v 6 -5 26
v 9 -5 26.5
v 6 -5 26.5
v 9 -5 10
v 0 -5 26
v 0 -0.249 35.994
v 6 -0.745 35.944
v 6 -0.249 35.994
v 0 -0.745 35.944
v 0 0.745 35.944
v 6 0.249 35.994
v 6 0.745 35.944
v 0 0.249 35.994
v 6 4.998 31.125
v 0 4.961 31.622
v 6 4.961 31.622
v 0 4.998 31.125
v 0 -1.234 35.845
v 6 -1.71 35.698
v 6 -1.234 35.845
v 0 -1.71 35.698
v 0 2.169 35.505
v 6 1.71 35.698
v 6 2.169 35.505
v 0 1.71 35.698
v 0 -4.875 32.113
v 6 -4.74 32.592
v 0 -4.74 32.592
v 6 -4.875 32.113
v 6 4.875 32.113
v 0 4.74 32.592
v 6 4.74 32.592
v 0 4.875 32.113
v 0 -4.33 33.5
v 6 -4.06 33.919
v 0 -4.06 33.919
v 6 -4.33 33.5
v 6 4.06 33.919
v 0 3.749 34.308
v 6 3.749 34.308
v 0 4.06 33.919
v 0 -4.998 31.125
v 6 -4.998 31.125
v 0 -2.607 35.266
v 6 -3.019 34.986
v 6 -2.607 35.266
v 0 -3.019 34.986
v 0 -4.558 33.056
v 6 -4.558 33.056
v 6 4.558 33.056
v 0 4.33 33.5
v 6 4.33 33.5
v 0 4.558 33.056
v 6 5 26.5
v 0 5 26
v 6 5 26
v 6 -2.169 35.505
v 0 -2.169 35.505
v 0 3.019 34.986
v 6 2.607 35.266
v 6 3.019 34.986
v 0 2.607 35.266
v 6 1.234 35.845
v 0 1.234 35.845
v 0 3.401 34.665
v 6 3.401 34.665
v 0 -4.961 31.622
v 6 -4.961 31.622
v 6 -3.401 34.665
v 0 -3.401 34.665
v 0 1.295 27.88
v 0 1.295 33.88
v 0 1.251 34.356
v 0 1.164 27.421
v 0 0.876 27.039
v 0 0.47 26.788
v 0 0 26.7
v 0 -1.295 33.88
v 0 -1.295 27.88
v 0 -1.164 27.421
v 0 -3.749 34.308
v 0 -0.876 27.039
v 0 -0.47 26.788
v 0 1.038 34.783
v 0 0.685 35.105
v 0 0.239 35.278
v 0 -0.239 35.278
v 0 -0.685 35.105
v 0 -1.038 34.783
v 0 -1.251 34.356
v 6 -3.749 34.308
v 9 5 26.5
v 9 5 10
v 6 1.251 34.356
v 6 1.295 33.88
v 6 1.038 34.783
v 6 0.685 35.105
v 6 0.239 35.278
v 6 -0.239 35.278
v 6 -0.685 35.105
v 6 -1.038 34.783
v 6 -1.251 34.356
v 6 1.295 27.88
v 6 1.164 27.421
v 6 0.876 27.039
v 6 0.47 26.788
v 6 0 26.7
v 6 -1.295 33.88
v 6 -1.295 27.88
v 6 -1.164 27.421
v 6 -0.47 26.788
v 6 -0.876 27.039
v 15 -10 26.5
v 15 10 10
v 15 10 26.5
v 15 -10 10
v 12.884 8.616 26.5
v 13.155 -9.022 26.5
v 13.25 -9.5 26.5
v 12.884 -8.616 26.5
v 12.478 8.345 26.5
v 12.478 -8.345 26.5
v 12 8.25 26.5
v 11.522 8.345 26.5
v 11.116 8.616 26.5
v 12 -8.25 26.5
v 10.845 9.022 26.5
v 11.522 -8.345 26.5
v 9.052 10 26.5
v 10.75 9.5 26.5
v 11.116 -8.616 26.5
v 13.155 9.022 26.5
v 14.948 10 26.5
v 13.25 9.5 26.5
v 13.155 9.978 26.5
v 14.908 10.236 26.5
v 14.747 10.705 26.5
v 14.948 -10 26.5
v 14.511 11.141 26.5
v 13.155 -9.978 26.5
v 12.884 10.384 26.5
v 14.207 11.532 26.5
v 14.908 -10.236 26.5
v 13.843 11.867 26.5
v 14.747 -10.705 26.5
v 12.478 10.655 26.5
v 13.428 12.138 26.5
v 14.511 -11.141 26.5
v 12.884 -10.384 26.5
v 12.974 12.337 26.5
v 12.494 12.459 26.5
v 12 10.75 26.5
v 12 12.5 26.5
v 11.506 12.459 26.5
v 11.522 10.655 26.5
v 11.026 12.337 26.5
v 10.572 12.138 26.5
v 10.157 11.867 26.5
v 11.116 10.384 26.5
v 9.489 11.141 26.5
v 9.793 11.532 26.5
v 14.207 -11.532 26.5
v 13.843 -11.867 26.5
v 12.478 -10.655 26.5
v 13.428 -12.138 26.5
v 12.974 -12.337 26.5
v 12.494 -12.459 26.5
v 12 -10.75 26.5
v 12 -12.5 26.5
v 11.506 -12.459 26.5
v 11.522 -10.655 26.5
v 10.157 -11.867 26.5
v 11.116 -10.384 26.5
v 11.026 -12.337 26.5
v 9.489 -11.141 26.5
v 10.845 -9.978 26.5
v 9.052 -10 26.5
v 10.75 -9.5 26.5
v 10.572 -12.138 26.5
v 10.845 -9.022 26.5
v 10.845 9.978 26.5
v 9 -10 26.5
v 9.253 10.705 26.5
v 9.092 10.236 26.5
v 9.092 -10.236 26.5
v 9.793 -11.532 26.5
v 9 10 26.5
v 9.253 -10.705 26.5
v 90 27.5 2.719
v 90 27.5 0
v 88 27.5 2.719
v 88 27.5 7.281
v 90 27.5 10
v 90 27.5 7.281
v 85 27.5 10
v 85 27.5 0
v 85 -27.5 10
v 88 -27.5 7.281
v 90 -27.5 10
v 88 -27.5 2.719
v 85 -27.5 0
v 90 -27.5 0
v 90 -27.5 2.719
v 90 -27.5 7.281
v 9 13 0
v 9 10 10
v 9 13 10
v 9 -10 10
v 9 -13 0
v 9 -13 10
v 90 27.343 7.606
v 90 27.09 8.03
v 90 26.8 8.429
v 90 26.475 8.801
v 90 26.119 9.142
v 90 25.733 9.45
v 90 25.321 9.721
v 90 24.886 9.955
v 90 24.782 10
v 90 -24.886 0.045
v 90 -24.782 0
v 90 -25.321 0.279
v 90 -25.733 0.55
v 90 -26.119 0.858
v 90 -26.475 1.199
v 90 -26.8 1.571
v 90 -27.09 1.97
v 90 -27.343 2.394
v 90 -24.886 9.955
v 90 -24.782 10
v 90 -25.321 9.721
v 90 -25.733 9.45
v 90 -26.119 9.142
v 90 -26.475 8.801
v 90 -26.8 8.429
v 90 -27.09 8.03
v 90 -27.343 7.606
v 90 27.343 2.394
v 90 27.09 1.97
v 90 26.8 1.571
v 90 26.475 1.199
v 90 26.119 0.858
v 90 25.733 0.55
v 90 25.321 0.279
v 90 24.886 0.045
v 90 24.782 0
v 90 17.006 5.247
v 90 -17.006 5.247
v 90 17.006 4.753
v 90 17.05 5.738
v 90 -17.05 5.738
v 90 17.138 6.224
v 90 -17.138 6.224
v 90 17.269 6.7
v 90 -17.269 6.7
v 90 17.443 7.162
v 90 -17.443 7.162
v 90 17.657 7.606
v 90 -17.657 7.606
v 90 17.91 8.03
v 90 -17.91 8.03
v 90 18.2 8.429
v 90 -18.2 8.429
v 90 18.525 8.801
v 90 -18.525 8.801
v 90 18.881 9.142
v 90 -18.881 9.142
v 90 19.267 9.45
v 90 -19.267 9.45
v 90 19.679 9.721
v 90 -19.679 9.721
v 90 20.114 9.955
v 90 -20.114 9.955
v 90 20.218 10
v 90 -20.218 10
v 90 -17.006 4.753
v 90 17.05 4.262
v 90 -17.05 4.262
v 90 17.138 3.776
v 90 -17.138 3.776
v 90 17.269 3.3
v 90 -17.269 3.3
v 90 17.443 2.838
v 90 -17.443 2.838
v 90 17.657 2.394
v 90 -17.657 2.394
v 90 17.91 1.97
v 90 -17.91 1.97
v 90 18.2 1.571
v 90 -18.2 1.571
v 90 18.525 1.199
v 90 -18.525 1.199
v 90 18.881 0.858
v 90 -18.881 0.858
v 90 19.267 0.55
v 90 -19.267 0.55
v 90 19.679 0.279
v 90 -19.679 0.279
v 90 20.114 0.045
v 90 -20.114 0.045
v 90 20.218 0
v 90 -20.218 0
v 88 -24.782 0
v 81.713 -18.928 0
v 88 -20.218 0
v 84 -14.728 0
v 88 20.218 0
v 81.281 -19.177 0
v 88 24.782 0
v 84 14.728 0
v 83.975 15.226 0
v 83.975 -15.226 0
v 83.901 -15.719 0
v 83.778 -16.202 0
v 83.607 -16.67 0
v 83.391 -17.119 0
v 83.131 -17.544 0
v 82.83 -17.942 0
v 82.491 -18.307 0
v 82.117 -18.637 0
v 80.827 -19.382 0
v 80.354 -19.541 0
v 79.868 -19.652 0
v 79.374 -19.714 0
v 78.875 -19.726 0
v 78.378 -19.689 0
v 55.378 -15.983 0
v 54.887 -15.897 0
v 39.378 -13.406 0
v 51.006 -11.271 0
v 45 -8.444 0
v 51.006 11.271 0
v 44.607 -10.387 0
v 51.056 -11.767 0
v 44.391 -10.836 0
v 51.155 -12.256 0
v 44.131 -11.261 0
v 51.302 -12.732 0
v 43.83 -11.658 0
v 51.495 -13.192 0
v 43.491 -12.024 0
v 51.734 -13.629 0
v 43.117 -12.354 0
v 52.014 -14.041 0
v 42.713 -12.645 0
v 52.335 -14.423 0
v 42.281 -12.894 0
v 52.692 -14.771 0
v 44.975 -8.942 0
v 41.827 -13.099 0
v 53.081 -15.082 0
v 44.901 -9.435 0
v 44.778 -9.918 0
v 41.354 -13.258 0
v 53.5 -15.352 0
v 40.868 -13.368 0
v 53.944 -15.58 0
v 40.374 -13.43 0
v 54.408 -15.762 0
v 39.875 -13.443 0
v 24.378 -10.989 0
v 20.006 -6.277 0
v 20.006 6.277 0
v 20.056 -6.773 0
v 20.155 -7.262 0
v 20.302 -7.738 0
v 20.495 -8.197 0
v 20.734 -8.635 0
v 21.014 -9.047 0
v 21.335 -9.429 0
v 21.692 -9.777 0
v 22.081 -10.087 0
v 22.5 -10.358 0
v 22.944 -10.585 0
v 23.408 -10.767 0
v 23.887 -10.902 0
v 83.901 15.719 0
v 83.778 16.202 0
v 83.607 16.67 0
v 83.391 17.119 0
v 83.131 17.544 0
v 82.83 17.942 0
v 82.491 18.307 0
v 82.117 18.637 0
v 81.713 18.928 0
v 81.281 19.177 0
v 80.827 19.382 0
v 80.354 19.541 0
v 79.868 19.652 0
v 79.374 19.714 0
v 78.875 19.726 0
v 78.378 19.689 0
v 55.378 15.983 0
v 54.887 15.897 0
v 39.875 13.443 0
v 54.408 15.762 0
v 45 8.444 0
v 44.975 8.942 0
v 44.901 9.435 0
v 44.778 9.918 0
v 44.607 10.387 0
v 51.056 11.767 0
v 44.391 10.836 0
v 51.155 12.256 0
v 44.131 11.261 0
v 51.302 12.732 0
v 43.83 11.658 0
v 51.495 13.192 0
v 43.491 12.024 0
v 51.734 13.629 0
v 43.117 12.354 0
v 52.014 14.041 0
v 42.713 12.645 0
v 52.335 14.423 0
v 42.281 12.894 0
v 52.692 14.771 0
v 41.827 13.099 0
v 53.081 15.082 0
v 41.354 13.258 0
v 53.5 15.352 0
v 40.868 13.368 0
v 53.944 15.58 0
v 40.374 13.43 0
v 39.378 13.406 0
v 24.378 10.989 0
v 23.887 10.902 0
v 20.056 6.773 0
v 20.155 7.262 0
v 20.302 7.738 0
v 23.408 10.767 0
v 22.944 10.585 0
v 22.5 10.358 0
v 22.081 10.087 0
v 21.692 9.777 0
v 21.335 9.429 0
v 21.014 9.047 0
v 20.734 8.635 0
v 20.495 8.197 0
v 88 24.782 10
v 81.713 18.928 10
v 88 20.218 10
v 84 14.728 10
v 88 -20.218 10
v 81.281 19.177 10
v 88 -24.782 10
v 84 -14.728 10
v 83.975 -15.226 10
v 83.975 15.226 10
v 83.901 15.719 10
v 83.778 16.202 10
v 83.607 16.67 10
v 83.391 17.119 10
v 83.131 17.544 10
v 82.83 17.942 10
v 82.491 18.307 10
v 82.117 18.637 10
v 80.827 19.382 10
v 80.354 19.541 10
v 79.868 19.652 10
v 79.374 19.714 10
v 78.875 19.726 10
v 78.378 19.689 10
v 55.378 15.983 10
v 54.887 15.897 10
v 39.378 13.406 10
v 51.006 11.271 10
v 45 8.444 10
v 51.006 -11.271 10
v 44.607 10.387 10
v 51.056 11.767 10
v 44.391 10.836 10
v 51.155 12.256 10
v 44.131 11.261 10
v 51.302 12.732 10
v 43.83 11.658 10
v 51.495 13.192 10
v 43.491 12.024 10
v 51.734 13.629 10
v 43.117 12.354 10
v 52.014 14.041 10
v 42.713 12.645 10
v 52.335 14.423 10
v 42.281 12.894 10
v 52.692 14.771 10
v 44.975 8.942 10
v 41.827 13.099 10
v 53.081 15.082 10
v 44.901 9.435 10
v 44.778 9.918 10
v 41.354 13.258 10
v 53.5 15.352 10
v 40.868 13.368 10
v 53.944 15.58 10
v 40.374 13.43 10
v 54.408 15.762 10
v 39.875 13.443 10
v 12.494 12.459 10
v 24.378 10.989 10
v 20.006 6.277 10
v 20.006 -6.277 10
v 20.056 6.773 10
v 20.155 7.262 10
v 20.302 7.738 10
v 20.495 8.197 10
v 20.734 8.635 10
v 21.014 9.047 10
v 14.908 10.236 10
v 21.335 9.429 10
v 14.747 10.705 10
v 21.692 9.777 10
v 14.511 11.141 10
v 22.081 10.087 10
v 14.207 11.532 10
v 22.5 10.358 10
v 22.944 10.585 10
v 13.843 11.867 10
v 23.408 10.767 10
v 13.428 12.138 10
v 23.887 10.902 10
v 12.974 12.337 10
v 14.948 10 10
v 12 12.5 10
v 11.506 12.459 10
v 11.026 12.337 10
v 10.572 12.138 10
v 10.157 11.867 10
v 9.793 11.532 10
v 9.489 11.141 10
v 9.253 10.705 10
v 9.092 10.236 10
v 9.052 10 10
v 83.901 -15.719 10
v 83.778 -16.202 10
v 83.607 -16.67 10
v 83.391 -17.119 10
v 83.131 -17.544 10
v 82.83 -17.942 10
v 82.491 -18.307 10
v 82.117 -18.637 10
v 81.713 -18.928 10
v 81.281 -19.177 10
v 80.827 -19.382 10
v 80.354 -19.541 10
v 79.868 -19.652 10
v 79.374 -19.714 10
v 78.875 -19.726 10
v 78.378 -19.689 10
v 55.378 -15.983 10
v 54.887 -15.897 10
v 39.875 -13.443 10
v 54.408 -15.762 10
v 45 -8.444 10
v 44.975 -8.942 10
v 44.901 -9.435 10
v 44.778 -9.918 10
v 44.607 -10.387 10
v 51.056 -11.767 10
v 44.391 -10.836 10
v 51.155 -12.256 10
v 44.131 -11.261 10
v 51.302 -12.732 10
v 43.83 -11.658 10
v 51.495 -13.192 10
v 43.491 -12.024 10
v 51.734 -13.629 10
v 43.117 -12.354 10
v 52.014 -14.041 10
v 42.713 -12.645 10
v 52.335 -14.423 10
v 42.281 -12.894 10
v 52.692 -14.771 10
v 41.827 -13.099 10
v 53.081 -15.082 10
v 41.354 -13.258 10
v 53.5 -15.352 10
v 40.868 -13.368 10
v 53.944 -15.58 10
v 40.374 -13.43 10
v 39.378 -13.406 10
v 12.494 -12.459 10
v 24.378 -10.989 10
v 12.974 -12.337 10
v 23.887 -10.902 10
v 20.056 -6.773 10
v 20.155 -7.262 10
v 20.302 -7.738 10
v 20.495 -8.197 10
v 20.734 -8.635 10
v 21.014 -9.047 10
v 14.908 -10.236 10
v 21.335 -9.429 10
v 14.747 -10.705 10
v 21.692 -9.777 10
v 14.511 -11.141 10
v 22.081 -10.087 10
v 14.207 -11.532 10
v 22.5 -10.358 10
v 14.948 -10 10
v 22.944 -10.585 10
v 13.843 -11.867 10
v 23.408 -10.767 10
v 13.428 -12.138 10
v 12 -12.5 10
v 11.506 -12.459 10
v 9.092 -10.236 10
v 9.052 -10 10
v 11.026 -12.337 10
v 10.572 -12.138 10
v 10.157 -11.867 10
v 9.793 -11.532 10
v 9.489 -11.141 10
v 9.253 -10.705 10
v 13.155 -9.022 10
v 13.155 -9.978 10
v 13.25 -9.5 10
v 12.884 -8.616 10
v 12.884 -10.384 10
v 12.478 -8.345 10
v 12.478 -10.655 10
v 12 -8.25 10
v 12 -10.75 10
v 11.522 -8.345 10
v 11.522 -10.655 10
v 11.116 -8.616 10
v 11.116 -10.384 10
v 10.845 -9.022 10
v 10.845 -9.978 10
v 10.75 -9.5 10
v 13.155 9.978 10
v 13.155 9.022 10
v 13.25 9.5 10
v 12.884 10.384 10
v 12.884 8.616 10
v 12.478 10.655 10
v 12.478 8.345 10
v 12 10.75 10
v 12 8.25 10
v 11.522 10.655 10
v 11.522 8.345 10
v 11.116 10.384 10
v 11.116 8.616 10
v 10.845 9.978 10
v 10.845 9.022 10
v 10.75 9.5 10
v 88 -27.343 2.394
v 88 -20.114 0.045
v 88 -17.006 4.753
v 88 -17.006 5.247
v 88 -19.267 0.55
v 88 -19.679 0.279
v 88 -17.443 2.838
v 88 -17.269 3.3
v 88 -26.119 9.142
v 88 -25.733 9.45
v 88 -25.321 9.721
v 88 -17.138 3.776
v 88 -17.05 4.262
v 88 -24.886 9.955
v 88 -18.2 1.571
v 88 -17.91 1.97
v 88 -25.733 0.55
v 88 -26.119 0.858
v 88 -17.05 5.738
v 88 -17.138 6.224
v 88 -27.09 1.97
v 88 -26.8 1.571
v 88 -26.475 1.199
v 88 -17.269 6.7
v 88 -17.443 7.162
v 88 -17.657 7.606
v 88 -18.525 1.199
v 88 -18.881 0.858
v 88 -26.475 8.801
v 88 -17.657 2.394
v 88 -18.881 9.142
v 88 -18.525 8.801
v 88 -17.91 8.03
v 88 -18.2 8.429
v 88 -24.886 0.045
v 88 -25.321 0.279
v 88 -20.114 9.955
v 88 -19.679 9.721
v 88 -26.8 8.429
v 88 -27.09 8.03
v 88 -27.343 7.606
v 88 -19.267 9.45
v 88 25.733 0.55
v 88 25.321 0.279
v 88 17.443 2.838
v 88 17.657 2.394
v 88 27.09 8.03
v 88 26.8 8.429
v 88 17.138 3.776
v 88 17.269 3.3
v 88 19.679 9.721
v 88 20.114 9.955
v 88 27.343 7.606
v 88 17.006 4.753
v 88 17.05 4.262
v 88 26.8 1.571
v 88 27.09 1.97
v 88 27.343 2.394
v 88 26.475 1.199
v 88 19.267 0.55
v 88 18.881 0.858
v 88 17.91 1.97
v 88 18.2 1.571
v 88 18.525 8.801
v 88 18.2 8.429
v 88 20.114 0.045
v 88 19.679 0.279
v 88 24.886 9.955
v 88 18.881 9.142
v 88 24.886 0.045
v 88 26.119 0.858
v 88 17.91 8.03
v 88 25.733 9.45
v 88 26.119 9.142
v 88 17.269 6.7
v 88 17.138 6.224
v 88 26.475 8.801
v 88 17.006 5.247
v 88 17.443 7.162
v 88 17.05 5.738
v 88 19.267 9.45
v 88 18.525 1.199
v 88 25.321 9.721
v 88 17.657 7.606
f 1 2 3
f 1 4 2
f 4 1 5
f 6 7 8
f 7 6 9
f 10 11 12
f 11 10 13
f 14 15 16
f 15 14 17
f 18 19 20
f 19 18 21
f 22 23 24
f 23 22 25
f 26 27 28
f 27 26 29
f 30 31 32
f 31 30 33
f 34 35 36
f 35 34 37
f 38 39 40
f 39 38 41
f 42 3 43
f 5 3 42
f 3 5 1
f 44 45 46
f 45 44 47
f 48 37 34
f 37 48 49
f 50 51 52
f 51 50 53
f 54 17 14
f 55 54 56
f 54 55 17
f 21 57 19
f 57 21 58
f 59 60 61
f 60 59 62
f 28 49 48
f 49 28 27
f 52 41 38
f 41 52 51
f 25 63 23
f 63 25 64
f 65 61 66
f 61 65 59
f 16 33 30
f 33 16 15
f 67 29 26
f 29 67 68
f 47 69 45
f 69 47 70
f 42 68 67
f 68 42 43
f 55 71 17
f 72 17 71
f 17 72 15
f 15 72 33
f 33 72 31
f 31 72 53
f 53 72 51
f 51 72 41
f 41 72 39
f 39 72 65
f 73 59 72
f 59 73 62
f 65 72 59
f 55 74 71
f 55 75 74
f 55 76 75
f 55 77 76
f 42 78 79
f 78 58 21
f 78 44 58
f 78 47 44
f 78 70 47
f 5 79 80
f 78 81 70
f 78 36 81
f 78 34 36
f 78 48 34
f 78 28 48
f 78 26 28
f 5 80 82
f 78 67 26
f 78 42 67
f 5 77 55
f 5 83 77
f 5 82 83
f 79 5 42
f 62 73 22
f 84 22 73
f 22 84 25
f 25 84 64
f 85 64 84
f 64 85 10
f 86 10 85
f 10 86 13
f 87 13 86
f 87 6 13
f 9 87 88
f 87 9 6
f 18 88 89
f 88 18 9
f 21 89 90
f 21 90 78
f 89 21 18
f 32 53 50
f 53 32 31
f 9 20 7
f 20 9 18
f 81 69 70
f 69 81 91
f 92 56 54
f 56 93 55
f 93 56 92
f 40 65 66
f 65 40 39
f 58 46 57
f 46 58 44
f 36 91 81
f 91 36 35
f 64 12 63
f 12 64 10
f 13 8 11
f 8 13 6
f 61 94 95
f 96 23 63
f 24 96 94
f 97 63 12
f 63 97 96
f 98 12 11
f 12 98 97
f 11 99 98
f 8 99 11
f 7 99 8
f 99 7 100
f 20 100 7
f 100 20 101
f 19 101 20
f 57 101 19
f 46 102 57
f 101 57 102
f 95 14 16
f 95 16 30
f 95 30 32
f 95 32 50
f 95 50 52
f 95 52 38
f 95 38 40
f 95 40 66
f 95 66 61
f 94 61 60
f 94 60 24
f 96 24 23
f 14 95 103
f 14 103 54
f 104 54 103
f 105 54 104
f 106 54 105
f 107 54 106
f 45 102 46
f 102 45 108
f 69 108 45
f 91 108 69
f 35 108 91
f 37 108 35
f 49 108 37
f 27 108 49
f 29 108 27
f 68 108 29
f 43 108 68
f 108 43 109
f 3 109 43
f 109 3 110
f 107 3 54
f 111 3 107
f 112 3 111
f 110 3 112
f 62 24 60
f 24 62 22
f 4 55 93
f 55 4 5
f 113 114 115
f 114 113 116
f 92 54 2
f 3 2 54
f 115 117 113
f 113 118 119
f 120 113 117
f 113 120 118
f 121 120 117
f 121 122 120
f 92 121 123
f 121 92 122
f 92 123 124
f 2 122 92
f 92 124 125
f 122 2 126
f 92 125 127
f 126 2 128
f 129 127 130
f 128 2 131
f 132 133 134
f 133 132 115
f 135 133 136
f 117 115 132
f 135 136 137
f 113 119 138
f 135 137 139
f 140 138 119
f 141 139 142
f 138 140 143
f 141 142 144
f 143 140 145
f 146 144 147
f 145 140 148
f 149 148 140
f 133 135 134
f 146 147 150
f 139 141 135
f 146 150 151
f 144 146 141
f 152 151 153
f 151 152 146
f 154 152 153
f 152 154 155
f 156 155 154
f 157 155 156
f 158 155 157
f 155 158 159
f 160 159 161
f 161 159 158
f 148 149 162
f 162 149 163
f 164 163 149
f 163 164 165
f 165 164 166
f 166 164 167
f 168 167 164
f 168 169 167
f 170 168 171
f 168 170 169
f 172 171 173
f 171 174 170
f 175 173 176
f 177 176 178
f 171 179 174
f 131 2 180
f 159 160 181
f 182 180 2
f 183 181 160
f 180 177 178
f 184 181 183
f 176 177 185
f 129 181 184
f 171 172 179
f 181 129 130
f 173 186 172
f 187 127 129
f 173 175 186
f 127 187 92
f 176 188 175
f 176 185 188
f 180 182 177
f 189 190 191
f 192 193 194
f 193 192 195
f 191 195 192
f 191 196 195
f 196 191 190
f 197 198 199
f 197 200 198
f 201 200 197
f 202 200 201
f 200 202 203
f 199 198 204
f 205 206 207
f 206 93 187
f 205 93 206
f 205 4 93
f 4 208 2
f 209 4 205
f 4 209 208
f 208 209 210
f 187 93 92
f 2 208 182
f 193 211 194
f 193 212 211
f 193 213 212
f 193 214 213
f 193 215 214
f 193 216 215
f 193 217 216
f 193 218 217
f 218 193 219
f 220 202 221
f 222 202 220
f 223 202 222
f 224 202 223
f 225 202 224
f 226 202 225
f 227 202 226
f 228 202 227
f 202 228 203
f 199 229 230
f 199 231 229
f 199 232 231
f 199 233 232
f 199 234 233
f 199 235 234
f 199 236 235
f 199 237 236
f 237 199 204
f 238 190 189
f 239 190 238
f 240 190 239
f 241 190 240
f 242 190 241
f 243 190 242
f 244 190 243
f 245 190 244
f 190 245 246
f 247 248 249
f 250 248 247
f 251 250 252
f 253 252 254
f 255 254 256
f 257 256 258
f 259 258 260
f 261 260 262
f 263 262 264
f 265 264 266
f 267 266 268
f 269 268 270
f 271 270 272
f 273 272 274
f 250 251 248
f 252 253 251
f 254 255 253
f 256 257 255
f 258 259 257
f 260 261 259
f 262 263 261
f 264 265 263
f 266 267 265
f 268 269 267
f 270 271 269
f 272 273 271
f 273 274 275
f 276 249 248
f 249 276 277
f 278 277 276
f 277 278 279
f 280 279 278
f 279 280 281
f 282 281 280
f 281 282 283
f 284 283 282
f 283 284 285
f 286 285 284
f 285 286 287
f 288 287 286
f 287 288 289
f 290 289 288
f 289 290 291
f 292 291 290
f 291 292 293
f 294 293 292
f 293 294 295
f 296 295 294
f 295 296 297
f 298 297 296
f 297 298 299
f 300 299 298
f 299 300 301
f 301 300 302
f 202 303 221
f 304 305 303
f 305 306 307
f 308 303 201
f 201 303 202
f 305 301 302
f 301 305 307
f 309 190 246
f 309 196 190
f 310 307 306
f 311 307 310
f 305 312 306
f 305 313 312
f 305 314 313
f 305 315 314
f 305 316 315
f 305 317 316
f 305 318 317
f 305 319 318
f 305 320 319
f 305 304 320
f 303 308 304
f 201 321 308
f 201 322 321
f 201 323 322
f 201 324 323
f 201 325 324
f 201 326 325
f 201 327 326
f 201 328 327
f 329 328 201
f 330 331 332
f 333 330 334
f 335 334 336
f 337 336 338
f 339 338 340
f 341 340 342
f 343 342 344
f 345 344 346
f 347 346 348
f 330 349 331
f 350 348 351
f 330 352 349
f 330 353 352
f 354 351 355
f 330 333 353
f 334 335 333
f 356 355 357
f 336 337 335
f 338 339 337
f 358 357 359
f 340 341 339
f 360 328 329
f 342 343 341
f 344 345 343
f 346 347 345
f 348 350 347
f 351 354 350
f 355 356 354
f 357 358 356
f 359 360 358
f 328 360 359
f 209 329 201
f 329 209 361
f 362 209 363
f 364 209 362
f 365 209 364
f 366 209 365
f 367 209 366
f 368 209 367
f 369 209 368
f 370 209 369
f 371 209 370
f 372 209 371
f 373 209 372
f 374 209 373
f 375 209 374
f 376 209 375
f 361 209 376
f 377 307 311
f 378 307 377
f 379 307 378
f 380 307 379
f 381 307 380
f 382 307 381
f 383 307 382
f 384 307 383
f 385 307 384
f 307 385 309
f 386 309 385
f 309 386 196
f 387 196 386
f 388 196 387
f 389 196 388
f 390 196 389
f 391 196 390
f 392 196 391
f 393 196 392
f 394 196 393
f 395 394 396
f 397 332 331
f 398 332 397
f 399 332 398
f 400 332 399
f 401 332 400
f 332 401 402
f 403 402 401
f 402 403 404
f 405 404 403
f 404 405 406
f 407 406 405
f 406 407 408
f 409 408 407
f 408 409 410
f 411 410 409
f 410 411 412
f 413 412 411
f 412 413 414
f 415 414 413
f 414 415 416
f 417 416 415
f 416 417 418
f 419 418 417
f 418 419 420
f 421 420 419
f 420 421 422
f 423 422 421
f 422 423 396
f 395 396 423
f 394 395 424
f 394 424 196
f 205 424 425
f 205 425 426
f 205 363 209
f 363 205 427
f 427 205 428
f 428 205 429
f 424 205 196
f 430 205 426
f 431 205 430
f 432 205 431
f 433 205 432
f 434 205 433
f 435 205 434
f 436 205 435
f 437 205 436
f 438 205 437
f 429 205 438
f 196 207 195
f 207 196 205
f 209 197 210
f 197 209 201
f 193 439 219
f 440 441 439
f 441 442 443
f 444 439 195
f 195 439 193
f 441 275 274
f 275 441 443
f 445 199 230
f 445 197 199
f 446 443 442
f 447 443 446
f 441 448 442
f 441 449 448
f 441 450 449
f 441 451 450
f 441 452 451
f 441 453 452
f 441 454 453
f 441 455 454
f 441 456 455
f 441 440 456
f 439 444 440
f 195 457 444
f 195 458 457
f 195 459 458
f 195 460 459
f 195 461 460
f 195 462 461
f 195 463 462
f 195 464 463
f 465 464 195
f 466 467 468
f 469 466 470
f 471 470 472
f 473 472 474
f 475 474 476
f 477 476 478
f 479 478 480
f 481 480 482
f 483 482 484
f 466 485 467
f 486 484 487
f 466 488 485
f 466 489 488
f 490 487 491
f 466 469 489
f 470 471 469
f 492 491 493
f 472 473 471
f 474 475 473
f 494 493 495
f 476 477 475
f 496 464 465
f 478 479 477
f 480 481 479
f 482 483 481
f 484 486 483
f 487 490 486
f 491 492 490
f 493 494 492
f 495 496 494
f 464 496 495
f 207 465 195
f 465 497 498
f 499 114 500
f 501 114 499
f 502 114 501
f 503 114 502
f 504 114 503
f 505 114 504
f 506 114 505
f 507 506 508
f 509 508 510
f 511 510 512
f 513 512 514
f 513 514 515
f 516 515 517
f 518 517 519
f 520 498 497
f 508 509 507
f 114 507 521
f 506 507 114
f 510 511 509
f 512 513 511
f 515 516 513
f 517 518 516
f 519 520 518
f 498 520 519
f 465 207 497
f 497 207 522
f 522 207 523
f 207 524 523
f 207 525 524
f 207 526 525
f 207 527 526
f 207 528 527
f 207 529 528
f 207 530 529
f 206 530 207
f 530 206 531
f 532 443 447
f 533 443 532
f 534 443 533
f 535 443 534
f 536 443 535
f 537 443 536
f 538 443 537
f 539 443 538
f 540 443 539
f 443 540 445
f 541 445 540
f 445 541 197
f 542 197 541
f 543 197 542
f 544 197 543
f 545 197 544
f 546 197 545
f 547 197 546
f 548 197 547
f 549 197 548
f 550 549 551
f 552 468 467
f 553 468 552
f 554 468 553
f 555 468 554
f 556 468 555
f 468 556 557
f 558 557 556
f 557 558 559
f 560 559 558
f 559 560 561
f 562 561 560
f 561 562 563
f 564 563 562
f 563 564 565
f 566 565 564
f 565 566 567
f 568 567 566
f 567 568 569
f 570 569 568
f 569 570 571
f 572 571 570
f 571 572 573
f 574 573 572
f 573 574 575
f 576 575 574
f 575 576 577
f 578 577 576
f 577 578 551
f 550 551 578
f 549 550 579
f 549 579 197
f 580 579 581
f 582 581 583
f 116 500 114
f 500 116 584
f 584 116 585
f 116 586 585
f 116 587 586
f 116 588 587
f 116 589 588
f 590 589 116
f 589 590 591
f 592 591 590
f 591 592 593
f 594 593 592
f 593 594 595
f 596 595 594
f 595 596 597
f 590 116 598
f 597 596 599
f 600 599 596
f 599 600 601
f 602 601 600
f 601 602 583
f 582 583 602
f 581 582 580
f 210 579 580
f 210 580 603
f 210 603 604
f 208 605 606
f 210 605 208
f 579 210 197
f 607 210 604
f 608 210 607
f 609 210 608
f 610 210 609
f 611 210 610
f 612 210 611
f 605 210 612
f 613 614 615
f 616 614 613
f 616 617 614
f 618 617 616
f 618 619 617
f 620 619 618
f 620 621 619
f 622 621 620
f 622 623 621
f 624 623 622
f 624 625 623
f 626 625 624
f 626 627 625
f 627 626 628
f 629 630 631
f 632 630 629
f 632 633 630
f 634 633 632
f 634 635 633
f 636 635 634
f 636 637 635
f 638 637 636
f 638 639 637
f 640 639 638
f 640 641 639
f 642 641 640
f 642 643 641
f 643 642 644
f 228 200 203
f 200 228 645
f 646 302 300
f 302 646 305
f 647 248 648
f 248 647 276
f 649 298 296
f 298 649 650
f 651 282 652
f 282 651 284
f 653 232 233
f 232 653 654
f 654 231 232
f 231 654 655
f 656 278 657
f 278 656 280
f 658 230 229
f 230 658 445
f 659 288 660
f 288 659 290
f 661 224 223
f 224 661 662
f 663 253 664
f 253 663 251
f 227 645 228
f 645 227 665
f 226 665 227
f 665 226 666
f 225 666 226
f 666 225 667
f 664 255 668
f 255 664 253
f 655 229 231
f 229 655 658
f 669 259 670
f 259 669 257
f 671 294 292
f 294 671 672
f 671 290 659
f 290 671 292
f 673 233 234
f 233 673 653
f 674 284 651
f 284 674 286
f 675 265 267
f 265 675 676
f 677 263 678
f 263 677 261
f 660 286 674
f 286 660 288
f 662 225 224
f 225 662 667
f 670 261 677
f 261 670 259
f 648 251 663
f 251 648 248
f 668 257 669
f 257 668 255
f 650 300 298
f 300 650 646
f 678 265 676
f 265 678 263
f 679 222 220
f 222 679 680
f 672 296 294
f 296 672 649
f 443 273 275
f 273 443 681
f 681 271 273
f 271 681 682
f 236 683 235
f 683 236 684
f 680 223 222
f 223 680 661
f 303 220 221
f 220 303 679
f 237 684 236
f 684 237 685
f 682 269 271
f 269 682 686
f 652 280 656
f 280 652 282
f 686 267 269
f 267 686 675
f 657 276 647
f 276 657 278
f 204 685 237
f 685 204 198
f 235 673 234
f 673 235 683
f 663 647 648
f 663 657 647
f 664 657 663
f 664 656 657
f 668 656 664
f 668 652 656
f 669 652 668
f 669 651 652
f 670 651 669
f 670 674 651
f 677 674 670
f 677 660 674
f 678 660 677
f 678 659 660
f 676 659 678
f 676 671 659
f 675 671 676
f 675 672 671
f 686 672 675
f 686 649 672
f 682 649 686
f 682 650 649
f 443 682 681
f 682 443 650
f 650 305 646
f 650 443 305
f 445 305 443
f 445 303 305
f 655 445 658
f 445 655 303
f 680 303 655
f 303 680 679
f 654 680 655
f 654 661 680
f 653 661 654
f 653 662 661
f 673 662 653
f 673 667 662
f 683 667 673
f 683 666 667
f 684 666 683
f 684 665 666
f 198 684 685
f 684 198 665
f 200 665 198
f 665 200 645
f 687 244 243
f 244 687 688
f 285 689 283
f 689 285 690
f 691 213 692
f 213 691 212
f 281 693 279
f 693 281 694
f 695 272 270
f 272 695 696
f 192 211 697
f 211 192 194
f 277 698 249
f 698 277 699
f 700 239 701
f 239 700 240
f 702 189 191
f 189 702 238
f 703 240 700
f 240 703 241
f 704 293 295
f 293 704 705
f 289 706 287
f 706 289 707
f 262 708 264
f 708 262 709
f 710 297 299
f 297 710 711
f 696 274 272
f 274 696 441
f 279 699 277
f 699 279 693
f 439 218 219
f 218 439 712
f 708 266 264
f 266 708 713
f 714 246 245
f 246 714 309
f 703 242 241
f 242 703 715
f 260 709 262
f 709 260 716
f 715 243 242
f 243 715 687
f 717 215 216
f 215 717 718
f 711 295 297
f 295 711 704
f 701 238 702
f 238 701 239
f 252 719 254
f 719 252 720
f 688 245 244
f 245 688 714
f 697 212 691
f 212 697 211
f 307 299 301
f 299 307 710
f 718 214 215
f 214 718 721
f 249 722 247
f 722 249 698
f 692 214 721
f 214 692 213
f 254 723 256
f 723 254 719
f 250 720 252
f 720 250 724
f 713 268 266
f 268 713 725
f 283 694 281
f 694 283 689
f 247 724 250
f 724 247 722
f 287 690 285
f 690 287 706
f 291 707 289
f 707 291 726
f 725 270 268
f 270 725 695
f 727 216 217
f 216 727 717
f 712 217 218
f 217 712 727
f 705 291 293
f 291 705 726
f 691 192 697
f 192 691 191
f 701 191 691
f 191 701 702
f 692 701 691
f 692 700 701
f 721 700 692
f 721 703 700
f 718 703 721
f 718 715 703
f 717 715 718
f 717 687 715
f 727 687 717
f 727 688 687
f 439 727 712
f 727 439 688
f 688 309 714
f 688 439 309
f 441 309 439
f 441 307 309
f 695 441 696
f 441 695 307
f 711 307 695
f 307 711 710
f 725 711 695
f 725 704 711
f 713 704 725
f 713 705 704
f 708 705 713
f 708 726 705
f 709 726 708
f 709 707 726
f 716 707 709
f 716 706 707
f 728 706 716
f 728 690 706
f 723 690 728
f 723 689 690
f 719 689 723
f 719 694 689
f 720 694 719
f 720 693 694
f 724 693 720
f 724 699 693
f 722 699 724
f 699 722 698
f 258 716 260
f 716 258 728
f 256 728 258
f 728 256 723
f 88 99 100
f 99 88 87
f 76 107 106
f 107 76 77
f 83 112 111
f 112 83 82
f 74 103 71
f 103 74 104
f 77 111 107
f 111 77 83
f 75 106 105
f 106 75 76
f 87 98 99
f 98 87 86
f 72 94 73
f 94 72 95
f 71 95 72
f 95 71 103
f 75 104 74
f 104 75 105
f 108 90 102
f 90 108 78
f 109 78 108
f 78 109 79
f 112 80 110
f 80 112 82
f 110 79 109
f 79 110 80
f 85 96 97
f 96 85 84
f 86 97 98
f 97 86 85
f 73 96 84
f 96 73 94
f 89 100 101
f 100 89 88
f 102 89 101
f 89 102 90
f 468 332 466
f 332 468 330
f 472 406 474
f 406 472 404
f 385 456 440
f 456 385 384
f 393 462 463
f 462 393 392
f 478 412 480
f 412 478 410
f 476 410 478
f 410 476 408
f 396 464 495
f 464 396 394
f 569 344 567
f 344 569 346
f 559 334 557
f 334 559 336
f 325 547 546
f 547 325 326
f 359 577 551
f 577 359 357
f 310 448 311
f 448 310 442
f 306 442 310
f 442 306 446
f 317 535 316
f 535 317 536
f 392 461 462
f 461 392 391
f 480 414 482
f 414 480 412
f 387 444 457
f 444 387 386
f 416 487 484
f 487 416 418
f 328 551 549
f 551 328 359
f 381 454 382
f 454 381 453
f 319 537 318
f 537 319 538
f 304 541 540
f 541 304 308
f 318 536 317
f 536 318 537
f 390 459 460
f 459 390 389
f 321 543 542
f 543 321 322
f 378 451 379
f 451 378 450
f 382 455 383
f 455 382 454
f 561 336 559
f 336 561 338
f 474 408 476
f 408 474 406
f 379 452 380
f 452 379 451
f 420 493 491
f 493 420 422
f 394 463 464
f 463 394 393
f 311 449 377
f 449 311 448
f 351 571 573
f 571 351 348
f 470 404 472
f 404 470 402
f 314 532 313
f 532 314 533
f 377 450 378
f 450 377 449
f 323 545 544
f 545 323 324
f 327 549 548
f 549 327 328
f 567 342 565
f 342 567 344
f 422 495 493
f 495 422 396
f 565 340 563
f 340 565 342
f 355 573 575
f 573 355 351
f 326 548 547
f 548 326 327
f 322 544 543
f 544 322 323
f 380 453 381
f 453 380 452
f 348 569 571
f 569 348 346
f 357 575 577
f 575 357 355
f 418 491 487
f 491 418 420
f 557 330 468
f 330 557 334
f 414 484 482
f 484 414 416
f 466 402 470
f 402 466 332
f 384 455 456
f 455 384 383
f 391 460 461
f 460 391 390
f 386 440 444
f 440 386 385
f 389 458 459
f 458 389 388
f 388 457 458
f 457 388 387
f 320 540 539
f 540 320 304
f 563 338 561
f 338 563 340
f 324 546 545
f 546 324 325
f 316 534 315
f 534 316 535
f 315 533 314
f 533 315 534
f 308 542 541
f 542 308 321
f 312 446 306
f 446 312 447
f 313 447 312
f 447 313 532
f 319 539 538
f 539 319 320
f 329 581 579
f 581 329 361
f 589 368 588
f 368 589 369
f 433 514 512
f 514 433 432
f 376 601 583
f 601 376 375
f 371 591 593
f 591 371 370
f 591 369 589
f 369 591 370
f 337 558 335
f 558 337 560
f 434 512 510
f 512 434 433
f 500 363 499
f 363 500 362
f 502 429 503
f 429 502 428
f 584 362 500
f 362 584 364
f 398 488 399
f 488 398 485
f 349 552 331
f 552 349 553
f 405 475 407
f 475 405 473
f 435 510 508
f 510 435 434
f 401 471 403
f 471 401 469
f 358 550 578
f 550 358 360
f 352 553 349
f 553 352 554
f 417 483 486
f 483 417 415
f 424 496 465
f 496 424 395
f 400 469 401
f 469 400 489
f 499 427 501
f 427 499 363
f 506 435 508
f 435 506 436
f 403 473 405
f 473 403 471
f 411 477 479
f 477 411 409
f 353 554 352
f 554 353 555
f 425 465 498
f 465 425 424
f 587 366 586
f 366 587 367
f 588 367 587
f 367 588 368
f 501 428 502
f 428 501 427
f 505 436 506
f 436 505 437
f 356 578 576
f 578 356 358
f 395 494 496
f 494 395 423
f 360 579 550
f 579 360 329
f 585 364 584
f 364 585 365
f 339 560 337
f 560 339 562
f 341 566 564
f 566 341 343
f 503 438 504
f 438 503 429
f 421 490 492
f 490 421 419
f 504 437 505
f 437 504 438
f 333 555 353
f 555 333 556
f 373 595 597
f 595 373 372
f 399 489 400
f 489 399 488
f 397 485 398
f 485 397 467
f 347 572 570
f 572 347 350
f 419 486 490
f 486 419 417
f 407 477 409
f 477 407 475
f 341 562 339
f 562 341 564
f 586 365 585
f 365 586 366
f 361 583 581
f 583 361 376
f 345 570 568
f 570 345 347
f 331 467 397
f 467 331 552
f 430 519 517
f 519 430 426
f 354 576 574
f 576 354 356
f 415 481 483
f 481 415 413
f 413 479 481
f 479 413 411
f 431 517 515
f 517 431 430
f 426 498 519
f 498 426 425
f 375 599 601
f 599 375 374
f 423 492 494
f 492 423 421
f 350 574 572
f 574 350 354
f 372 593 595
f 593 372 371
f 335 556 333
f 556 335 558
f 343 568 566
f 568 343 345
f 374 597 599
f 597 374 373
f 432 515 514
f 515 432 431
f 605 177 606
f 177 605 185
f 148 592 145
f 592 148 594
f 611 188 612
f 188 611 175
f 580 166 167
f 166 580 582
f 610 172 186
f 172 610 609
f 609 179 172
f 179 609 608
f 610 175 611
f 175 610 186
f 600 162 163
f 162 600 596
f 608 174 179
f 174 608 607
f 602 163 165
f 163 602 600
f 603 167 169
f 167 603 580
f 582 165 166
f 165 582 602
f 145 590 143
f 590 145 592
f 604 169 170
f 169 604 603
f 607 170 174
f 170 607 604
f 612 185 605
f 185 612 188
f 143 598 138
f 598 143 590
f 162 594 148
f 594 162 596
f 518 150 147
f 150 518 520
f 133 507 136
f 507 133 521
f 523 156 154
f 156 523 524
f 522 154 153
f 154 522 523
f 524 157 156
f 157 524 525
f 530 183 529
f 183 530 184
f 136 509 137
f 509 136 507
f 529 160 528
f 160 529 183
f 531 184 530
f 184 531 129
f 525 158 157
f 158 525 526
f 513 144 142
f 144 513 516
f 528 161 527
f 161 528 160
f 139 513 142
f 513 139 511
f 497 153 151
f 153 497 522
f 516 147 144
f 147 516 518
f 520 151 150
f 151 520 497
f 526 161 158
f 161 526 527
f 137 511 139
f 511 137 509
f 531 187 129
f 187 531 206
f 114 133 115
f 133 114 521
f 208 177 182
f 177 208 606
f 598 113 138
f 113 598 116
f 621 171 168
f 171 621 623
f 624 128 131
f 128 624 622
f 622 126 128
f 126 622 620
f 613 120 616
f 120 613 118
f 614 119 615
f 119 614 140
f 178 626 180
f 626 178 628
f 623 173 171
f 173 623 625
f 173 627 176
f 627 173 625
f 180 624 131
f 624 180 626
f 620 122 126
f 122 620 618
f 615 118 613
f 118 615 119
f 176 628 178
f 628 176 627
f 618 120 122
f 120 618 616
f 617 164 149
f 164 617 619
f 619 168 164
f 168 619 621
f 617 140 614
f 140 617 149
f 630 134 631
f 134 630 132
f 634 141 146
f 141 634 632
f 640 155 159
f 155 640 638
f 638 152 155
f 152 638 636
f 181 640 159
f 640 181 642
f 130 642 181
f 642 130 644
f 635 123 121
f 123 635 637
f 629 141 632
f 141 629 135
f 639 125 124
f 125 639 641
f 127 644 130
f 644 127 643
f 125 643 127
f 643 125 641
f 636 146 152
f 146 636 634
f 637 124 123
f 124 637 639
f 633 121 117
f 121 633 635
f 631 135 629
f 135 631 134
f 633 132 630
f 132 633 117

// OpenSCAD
/*[Part]*/

//Choose true to only print the probe pin
Print = "probe"; //[probe: z-probe, pin: probing pin, both: both, nopin: z-probe without probe attachement]

/*[Probe holder]*/
//Overall height
height = 90;  

//Depth of bridge
depth1 = 10;   

//Depth of probe holder
depth2 = 6;   

//Width of upper bridge part
length1 = 55; 

//Width of lower bridge part
length2 = 26; 

//Width of probe holder (should be at least 2*r_probe + 2)
length3 = 10; 

// = Delta_Effector_Offset
offset = 26;  

//Adapt to your design (trial & error, the less the factor, the less material is printed)
savematerial = 1.1; 

//choose a little bit bigger than actual magnet diameter
magnetdia = 11;

//choose a little bit smaller than actual magnet depth
magnetdepth = 1; 
//seperation of magnets
magnetsep = 45; 

/*[Probe pin]*/

//Depth of probe pin
r_probe = 4; 

//Overall thickness
d_probe = 1; 

//Probe pin height, choose rather short, 2 mm'ish
h_pin = 2.5; 

//Clearance between probe pin and probe hole (on each side); should be a loose fit;
clearance = 0.3; 


/*[Hidden]*/
$fs = 0.5; //0.2 for production, 1 for draft;
$fa = 2; //0.5 for production, 2 for draft;

//Deducted variables
hfz = offset + depth1/2; //height from zero
rn = depth2; //radius of lower part to nailholder 
h_probe = depth2; //cross_radius
r_pin = d_probe; //pin radius




//###main###

if(Print == "pin"){probe_pin();}
else{

  //Bridge
  difference(){
  union(){
    hull(){
    translate ([depth2+3.5,0,depth1/2]) cube([1,length2,depth1],center = true);
     translate ([height-2.5,0,depth1/2]) cube([5,length1,depth1],center = true);
      }
      

    
    //probe pin holder
   if(Print != "nopin"){
     translate ([depth2/2,0,hfz/2]) 
     union()
      { hull(){
        translate([0,0,hfz/2-length3/2])
        cube([depth2,length3,.001],center=true);
        translate([0,0,hfz/2]) rotate([0,90,0]) cylinder(r=            length3/2, h=depth2, center = true);
        }
        hull(){
        translate([0,0,hfz/2-length3/2])
        cube([depth2,length3,.001],center=true);
        translate([depth2+3,0,-hfz/2+depth1])
        cube([depth2,length3,.001],center=true);
        }
      }
    
    translate([depth2+3,0,(hfz+11)/2])         cube([6,length3,hfz-20],center=true);
    }
        
      //Bridge lower part
      //translate([1.5*rn,-length2/2+rn,depth1/2]) cylinder(r=rn, h=depth1, center = true);
        
      //translate([1.5*rn,length2/2-rn,depth1/2]) cylinder(r=rn, h=depth1, center = true);
        
      //translate([depth2,0,depth1/2]) cube([depth2,length2-2*rn,depth1], center = true);
    }
    

    
    
  //Probe hole
    translate ([-1,0,hfz]) rotate([0,90,0]) probe_cut();
    
  //Material saving
    hull(){
      for (x=[height-depth1*savematerial,height/2+depth1*savematerial]) {
        tempy=(length2+(length1-length2)*x/height)/2;
        for (y=[tempy-depth1*savematerial,-(tempy-depth1*savematerial)]) {
          translate([x,y,depth1/2])
          cylinder(r=depth1/2,h=depth1+1,center=true);
        }}}
      
      hull(){
      for (x=[height/2-depth1/2,4+depth1+depth1*savematerial]) {
        tempy=(length2+(length1-length2)*x/height)/2;
        for (y=[tempy-depth1*savematerial,-(tempy-depth1*savematerial)]) {
          translate([x,y,depth1/2])
          cylinder(r=depth1/2,h=depth1+1,center=true);
        }}}
    
   //Magnets
  for(y=[-magnetsep/2,magnetsep/2]) 
    translate([height-magnetdepth,y,depth1/2])
    rotate([0,90,0])
    cylinder(r=magnetdia/2,h=magnetdepth+1,center=true);
  
  //Extramagnets
    for(y=[-magnetsep/2,magnetsep/2]) 
    translate([height-magnetdepth,y,depth1/2+magnetdia*1.2])
    rotate([0,90,0])
    cylinder(r=magnetdia/2,h=magnetdepth+1,center=true);
  
  //Pin
  }



  //Endstop holder
  translate([depth2+6,0,0]) holder();

  if(Print == "both"){translate([-r_probe*2,0,0]) rotate([0,0,90]) probe_pin();}

}  



//###modules###
module holder() {
    rotate([0,0,90]) translate([0,0,hfz/2]){
        //translate ([0,6,0])
          //  cube([length3,6,hfz-9],center=true);
    difference(){
        union(){
            translate([-19/2,0,0]) cylinder(r=3,h=hfz-9,center=true);
    translate([19/2,0,0]) cylinder(r=3,hfz-9,center=true);
    cube([20,6,hfz-9], center = true);
        }
    translate([-19/2,0,0]) cylinder(r=1.25,h=hfz,center=true);
    translate([19/2,0,0]) cylinder(r=1.25,hfz,center=true);
    }}}

module probe_pin(){
  translate([0,0,h_probe/2+1])
  union(){
    translate([0,0,h_probe/2]) cylinder(r=r_pin, h= h_pin);
    
    minkowski(){
      union(){
      cube([(r_probe-d_probe)*2,.001,h_probe-0.001], center=true);
      };
      cylinder(r=d_probe,h=0.001, center=true);}
      
    translate([0,0,-h_probe/2-0.5])
      difference(){
      union(){minkowski(){
      cube([(r_probe-d_probe)*2,0.001,0.001], center=true);
      cylinder(r=d_probe*2,h=1, center=true);}}
      translate([r_probe,-d_probe*2,-d_probe*2]) cube(d_probe*4,d_probe*4,d_probe*2);}
      }
      
    }
  
 module probe_cut(){
  translate([0,0,h_probe/2+1])
  union(){
    
    minkowski(){
      cube([(r_probe-d_probe)*2,.001,2*h_probe-0.001], center=true);
      cylinder(r=d_probe+clearance,h=0.001, center=true);
    }}}
  
